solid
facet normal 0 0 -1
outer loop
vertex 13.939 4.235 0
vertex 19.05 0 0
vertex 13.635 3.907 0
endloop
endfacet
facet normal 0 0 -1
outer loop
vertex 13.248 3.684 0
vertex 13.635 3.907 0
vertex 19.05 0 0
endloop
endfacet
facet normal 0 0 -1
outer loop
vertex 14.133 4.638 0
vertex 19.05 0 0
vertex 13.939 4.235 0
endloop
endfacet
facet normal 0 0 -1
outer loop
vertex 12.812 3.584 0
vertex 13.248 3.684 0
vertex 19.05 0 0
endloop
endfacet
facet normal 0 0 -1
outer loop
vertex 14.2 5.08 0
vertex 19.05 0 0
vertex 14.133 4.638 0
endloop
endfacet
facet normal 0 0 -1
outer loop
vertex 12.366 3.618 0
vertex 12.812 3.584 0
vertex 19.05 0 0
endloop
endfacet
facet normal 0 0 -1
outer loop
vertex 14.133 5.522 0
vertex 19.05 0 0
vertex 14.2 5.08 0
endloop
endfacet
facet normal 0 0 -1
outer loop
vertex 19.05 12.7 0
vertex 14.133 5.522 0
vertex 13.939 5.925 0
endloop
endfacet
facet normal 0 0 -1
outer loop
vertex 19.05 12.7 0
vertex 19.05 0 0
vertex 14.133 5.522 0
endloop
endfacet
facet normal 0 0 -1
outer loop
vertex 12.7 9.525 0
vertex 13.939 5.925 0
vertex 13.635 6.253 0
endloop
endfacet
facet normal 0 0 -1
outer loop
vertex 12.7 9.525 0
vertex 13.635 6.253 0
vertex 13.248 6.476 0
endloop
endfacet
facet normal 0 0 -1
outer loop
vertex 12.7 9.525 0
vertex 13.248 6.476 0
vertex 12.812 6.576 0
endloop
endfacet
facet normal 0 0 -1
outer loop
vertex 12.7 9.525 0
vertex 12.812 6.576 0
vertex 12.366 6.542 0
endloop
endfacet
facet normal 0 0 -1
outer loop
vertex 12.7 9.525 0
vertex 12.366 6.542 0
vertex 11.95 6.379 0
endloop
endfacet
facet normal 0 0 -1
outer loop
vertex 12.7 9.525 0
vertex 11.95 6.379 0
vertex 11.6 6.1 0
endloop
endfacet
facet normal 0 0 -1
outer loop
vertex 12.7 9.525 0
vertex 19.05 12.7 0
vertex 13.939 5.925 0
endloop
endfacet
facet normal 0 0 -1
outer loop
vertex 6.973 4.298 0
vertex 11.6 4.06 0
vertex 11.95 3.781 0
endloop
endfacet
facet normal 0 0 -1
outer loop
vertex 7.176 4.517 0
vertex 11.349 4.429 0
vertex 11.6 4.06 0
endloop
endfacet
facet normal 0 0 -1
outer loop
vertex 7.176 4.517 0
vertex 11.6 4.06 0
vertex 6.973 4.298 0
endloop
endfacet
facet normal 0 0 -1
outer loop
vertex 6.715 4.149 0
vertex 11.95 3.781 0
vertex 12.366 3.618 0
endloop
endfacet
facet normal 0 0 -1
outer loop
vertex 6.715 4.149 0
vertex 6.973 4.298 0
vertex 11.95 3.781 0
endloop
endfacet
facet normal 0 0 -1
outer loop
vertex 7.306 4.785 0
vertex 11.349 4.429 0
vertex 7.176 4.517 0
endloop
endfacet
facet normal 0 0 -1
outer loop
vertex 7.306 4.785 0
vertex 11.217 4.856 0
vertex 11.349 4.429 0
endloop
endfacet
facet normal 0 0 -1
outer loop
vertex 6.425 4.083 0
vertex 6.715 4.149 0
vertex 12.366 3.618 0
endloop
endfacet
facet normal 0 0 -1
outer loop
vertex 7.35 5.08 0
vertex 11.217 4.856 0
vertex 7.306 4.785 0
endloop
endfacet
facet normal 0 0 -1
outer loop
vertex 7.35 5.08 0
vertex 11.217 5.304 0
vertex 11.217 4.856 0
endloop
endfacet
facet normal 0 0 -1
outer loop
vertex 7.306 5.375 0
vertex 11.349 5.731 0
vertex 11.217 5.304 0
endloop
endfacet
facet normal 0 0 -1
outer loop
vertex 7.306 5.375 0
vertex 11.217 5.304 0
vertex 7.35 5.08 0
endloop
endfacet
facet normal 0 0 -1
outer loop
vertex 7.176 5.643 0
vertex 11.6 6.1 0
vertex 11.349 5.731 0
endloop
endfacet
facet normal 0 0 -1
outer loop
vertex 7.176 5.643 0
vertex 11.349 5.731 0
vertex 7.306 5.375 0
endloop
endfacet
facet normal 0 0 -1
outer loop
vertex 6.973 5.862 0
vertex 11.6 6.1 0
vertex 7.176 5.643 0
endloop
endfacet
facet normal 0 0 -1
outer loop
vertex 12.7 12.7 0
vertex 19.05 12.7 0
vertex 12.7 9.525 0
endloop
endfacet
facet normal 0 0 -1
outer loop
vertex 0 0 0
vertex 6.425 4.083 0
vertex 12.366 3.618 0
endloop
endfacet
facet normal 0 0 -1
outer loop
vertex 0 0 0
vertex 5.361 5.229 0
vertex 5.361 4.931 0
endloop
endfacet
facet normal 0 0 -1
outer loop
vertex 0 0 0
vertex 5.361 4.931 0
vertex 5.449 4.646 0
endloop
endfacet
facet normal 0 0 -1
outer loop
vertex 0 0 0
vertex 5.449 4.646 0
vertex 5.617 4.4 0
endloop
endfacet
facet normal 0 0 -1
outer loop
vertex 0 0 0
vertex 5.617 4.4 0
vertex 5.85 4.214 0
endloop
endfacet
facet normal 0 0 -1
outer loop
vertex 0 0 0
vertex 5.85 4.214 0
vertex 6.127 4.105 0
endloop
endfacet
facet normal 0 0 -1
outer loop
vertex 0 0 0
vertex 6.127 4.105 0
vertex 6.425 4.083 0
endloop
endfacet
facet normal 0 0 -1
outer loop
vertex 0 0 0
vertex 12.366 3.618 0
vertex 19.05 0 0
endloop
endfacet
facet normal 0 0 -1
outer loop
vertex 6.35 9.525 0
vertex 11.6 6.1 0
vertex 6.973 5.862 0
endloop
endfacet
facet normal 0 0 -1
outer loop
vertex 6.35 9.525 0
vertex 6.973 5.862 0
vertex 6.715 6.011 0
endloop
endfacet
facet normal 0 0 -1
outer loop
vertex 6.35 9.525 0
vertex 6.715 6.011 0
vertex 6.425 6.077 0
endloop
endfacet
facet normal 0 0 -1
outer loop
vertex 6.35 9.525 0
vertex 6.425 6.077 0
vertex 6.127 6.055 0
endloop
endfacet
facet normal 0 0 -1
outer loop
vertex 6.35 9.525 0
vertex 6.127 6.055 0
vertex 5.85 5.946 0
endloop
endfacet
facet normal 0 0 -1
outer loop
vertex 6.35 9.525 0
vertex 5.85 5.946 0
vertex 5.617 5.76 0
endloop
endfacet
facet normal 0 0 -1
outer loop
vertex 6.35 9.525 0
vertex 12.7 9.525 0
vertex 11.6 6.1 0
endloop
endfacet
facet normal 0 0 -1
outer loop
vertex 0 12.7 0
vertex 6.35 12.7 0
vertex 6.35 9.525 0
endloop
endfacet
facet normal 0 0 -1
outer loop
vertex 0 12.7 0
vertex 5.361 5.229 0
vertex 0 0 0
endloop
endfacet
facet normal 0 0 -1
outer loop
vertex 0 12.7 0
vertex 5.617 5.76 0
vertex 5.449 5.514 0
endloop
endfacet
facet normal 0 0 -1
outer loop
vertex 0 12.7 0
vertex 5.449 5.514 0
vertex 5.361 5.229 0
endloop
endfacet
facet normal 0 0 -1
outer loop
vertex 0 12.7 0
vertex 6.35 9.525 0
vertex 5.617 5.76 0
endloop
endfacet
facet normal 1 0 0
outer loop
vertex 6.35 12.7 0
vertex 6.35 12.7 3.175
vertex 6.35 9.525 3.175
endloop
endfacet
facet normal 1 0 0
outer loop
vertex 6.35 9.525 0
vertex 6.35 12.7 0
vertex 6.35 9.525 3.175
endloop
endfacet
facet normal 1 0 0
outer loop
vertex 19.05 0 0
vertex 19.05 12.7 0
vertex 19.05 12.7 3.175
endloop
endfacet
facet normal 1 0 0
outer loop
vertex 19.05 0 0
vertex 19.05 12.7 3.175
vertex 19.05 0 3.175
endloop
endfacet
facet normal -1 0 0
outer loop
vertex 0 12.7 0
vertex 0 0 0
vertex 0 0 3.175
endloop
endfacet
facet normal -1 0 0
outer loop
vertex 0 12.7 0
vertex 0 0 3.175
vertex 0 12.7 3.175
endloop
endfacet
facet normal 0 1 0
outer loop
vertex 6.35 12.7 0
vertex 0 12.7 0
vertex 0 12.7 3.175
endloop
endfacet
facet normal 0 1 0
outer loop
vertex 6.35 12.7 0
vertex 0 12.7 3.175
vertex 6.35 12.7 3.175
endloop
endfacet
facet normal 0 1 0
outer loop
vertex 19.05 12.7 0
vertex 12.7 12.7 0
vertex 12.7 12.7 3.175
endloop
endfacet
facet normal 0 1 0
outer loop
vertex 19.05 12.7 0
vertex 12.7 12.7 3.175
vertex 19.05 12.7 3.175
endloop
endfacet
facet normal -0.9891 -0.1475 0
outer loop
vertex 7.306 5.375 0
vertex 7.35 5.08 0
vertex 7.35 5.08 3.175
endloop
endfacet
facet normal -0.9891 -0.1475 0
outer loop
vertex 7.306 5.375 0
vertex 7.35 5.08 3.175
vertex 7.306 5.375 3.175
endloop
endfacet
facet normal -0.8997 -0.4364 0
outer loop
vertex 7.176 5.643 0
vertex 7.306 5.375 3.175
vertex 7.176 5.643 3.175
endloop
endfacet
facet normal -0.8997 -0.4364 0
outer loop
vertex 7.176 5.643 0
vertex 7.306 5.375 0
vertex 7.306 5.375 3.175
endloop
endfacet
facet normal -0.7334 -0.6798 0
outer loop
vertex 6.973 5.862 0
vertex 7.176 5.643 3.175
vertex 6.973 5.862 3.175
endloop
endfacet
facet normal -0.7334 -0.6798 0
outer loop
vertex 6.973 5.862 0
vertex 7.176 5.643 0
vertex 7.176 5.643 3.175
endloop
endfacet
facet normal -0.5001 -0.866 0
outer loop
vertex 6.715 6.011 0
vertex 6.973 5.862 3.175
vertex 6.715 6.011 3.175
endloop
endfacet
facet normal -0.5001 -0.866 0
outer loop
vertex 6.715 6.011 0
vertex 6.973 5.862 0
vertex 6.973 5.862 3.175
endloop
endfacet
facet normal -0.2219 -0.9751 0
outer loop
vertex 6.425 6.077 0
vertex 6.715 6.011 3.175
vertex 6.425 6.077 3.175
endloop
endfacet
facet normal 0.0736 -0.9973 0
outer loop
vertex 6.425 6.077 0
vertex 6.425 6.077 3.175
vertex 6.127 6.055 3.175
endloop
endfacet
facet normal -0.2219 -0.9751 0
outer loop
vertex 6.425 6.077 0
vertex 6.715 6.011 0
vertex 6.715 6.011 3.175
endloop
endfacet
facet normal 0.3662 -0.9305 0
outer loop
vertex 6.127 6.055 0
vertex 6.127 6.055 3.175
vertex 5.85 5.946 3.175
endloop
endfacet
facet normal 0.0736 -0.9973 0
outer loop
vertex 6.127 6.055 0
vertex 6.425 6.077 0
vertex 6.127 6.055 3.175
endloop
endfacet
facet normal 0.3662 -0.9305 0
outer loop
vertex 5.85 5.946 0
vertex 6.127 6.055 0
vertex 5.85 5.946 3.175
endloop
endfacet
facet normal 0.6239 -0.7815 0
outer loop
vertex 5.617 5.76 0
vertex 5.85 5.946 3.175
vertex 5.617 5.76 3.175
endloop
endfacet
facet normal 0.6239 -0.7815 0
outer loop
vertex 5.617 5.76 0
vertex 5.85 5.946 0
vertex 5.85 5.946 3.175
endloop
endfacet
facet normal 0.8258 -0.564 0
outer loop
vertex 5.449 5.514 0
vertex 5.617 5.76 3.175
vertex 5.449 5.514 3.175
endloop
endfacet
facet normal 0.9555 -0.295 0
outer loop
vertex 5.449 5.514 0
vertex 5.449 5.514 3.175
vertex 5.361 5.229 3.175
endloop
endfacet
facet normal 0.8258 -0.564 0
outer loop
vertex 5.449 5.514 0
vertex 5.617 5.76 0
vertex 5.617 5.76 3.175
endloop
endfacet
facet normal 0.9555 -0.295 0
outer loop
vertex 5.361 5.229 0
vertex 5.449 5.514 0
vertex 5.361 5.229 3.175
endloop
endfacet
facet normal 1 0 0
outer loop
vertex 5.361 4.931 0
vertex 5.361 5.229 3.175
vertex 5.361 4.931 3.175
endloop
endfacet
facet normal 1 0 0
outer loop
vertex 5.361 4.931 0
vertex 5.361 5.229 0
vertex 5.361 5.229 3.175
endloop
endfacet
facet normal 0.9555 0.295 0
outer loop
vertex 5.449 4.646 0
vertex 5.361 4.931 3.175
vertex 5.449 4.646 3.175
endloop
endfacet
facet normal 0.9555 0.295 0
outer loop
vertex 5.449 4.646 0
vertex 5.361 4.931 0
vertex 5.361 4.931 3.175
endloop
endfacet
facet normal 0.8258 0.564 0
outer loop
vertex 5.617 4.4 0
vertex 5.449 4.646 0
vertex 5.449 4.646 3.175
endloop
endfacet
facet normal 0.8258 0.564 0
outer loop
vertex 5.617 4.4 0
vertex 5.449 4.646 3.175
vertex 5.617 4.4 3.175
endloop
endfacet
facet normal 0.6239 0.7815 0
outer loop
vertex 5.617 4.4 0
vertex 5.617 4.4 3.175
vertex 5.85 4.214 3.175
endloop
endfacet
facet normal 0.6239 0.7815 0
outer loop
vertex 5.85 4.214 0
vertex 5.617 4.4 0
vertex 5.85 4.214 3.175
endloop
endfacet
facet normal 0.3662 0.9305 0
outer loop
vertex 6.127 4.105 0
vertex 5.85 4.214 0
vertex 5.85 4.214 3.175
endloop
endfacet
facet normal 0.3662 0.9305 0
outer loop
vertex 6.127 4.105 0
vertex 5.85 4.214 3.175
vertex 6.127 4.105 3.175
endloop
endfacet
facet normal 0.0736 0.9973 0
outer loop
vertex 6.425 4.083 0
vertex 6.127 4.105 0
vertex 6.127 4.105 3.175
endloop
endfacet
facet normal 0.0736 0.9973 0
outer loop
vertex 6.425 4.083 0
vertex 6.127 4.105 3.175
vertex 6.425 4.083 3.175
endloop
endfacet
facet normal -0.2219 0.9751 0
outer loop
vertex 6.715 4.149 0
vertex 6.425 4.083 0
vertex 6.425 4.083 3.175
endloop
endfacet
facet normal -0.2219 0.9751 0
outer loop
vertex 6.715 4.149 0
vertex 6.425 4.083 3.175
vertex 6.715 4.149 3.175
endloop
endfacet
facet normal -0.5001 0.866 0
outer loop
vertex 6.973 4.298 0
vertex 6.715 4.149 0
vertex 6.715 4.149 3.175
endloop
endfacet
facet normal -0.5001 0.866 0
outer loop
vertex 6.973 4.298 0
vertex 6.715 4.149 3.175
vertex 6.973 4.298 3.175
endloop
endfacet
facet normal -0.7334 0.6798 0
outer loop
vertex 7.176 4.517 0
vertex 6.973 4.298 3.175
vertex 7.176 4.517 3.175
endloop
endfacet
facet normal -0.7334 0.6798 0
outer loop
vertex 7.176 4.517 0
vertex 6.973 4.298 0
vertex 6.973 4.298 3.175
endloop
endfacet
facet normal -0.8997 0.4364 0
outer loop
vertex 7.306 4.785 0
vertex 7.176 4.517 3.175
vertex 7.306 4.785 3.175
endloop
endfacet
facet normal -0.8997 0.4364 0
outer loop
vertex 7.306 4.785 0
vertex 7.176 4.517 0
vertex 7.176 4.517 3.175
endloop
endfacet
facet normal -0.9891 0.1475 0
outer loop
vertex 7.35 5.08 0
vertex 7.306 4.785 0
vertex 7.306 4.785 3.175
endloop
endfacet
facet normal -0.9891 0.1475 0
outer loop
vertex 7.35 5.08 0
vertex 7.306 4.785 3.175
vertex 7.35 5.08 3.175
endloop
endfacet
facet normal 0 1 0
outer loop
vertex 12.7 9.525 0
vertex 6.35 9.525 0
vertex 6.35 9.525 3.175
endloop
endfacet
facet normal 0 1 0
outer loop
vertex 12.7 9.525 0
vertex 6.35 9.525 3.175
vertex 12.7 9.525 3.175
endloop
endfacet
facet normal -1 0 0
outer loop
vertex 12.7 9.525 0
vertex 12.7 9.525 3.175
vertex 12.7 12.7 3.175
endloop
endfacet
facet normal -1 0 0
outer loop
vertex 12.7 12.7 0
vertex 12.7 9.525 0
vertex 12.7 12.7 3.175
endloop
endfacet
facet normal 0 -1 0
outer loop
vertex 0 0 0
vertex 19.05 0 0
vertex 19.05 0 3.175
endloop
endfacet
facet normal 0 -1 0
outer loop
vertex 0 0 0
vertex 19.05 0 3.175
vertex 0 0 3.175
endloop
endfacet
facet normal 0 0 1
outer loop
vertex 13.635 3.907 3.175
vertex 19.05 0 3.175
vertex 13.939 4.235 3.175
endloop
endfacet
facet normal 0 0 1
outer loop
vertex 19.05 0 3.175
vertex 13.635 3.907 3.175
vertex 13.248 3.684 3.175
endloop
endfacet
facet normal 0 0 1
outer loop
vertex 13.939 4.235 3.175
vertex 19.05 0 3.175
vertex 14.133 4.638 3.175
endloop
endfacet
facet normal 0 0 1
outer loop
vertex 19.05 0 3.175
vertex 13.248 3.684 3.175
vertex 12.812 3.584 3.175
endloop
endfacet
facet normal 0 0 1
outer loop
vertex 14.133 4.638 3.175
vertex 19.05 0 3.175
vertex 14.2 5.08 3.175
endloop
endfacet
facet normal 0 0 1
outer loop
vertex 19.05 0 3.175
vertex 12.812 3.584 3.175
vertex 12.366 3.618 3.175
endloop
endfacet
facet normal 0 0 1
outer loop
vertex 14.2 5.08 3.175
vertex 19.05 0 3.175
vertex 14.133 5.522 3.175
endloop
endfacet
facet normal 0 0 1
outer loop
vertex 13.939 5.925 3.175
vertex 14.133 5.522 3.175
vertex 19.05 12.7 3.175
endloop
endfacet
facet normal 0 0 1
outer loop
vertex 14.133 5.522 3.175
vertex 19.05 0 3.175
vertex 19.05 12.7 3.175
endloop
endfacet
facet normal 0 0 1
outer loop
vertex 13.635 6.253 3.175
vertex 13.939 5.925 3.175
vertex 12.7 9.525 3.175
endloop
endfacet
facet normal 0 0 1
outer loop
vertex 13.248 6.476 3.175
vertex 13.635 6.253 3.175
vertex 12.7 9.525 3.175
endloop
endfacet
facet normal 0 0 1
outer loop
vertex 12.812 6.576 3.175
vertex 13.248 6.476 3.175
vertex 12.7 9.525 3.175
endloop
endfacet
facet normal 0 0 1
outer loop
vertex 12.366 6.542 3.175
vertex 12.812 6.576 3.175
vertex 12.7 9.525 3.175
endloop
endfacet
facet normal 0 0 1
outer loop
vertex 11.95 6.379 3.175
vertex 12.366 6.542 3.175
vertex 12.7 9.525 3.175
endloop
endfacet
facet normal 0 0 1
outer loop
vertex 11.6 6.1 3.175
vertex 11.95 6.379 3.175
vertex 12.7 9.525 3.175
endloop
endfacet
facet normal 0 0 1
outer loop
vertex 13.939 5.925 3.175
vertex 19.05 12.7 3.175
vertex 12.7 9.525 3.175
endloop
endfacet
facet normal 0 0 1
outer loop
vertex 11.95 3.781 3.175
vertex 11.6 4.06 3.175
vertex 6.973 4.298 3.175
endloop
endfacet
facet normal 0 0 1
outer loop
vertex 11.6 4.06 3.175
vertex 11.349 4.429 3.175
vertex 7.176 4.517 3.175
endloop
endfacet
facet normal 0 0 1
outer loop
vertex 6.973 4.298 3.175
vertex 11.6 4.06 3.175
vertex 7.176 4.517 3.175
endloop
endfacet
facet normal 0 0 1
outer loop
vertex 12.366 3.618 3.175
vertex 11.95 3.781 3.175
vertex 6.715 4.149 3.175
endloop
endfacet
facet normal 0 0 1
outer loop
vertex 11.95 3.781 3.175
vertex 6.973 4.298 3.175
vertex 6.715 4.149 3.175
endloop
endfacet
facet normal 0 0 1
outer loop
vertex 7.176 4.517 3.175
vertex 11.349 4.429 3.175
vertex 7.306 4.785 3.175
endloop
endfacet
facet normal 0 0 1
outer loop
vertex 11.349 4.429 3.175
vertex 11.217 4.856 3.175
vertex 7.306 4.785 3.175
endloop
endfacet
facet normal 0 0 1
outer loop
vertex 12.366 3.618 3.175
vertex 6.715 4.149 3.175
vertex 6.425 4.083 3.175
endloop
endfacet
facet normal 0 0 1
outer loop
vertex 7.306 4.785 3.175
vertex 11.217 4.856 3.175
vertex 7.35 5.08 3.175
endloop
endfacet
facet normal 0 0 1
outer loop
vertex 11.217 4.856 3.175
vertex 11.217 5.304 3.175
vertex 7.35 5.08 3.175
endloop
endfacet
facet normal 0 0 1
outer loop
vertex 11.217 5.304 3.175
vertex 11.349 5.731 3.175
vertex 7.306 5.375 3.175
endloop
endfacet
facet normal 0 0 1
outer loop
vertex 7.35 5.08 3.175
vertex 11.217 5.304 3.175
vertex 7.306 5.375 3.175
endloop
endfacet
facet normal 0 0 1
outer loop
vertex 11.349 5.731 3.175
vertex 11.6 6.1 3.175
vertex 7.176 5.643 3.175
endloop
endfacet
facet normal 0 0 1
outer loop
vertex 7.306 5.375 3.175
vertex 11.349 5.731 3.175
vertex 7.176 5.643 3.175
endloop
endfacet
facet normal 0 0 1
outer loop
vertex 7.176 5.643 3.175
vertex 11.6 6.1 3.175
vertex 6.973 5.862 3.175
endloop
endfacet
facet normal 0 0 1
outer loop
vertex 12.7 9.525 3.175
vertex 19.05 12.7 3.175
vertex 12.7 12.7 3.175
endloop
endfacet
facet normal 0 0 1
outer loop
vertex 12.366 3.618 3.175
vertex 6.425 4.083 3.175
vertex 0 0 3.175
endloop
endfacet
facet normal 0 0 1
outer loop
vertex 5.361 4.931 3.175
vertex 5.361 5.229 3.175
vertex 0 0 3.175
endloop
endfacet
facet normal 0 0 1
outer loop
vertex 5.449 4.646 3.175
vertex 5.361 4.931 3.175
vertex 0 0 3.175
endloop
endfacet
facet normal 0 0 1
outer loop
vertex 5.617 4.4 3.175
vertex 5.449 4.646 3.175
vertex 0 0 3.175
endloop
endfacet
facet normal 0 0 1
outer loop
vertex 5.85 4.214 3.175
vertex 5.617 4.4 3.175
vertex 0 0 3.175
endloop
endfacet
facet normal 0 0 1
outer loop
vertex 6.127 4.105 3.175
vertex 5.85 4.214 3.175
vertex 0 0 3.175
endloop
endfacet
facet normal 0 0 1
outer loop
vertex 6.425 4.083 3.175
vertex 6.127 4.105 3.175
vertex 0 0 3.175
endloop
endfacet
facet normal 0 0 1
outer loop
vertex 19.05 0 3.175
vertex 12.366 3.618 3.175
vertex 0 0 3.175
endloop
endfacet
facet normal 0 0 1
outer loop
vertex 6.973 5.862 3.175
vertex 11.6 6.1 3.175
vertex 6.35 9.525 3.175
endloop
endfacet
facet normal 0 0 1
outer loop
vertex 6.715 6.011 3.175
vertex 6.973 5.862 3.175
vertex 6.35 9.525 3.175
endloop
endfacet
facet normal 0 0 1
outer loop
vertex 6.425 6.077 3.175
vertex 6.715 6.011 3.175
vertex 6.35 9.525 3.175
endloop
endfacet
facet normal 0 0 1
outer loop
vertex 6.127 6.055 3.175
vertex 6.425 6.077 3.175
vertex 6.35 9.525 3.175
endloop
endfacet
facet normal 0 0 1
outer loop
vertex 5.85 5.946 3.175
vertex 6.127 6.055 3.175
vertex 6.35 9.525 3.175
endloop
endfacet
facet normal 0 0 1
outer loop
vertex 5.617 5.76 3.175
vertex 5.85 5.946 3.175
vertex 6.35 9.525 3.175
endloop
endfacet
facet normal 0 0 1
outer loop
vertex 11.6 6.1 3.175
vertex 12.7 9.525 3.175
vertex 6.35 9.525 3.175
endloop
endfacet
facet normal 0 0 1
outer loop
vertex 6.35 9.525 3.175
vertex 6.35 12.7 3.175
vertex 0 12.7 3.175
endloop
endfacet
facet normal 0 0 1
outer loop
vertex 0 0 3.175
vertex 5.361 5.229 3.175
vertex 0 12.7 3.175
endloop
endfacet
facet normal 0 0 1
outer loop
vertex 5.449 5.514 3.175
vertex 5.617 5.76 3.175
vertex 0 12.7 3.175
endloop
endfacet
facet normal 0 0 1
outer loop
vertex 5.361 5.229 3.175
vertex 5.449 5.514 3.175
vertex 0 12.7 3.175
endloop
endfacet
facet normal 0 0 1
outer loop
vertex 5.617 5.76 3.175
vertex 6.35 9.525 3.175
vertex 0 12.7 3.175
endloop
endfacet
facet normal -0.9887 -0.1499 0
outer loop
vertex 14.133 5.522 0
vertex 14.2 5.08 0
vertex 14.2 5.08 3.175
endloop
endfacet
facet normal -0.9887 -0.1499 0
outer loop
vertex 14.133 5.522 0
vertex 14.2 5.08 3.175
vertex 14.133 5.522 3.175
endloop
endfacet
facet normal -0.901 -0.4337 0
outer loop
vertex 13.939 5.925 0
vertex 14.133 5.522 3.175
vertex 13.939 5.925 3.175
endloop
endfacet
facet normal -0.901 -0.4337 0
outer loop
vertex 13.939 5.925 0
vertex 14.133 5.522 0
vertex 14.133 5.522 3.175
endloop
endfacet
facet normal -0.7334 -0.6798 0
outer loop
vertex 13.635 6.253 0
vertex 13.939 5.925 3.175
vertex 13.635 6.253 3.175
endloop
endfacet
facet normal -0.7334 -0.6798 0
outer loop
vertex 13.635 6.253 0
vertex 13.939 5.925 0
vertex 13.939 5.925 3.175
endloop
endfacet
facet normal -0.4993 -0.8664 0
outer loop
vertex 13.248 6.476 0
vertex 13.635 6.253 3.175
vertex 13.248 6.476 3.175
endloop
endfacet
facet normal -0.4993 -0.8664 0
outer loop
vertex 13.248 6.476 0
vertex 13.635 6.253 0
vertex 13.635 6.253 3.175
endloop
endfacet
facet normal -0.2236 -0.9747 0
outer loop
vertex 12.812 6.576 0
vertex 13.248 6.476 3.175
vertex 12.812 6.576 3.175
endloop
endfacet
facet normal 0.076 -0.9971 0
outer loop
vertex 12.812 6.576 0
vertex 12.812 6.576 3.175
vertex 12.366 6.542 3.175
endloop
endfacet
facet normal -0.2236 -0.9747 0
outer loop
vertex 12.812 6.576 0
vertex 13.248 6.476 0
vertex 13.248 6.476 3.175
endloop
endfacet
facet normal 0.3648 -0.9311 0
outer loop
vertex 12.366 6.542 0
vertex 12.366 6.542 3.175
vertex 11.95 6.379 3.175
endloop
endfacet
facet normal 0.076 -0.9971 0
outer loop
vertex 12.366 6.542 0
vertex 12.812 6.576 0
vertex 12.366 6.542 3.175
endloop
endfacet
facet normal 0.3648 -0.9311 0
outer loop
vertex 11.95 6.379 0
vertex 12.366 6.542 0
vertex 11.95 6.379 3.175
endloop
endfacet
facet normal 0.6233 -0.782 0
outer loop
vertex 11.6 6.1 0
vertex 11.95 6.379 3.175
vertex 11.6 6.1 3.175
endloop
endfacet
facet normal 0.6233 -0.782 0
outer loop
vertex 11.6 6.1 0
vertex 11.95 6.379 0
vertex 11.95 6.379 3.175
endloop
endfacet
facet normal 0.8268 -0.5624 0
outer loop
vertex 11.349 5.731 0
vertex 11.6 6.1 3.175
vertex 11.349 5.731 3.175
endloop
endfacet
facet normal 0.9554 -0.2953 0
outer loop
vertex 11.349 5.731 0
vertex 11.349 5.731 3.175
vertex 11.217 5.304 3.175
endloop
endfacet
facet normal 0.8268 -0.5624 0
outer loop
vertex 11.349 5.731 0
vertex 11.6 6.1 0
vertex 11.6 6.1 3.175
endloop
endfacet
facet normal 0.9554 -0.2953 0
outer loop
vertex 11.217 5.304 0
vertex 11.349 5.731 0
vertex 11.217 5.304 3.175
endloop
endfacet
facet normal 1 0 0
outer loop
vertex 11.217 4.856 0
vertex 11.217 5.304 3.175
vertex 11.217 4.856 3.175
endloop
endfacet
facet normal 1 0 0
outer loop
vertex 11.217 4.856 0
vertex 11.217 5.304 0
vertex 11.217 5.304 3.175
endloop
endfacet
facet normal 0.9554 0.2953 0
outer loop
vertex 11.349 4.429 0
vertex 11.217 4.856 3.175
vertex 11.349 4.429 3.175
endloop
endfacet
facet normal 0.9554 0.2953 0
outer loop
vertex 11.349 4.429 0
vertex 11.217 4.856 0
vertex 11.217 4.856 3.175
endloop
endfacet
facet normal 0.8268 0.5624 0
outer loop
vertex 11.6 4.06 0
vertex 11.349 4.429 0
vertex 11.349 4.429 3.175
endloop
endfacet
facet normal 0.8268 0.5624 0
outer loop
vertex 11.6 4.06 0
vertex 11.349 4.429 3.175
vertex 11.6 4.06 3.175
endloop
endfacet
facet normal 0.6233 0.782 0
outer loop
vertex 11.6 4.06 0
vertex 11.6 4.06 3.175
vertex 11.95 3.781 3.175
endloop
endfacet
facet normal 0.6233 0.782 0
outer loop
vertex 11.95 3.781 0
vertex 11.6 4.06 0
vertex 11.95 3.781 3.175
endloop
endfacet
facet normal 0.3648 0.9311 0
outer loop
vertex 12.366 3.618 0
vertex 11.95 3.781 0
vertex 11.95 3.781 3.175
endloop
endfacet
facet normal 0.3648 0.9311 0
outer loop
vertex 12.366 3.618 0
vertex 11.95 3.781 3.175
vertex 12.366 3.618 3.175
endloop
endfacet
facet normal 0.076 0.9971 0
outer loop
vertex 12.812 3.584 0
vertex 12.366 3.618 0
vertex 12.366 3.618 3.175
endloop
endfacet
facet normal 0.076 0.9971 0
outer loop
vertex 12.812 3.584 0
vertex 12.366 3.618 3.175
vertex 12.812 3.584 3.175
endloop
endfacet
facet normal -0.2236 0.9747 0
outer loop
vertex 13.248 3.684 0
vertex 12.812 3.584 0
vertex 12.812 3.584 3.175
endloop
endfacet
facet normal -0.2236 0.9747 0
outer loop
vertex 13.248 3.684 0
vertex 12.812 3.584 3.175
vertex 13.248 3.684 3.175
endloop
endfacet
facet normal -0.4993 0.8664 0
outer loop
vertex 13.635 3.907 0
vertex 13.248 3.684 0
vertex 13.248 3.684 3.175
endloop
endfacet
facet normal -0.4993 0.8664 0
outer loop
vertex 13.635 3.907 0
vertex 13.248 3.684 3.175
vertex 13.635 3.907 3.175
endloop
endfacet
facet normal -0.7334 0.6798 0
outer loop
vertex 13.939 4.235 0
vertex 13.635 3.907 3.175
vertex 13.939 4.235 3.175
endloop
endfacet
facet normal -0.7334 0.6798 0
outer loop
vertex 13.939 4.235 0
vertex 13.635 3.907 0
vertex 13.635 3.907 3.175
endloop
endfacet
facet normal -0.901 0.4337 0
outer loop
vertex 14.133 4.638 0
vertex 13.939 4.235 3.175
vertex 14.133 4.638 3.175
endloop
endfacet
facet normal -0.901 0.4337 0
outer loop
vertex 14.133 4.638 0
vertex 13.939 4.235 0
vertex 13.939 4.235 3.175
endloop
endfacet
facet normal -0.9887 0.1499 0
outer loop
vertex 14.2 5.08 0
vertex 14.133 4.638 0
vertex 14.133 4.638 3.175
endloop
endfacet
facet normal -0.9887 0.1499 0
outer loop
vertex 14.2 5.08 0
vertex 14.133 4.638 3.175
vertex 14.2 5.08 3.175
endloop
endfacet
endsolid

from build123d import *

# Parameters (mm, degrees)
SKETCH1_R           = 1.5
SKETCH1_R_2         = 1
BOSS_EXTRUDE1_DEPTH = 3.175


with BuildPart() as part:
    # Sketch1 → Boss-Extrude1 (new body)
    with BuildSketch(Plane.XY):
        Polygon((6.35, 12.7), (6.35, 9.525), (12.7, 9.525), (12.7, 12.7), (19.05, 12.7), (19.05, 0), (0, 0), (0, 12.7), align=None)
        with Locations((12.7, 5.08)):
            Circle(SKETCH1_R, mode=Mode.SUBTRACT)
        with Locations((6.35, 5.08)):
            Circle(SKETCH1_R_2, mode=Mode.SUBTRACT)
    extrude(amount=BOSS_EXTRUDE1_DEPTH)


solid = part.part
